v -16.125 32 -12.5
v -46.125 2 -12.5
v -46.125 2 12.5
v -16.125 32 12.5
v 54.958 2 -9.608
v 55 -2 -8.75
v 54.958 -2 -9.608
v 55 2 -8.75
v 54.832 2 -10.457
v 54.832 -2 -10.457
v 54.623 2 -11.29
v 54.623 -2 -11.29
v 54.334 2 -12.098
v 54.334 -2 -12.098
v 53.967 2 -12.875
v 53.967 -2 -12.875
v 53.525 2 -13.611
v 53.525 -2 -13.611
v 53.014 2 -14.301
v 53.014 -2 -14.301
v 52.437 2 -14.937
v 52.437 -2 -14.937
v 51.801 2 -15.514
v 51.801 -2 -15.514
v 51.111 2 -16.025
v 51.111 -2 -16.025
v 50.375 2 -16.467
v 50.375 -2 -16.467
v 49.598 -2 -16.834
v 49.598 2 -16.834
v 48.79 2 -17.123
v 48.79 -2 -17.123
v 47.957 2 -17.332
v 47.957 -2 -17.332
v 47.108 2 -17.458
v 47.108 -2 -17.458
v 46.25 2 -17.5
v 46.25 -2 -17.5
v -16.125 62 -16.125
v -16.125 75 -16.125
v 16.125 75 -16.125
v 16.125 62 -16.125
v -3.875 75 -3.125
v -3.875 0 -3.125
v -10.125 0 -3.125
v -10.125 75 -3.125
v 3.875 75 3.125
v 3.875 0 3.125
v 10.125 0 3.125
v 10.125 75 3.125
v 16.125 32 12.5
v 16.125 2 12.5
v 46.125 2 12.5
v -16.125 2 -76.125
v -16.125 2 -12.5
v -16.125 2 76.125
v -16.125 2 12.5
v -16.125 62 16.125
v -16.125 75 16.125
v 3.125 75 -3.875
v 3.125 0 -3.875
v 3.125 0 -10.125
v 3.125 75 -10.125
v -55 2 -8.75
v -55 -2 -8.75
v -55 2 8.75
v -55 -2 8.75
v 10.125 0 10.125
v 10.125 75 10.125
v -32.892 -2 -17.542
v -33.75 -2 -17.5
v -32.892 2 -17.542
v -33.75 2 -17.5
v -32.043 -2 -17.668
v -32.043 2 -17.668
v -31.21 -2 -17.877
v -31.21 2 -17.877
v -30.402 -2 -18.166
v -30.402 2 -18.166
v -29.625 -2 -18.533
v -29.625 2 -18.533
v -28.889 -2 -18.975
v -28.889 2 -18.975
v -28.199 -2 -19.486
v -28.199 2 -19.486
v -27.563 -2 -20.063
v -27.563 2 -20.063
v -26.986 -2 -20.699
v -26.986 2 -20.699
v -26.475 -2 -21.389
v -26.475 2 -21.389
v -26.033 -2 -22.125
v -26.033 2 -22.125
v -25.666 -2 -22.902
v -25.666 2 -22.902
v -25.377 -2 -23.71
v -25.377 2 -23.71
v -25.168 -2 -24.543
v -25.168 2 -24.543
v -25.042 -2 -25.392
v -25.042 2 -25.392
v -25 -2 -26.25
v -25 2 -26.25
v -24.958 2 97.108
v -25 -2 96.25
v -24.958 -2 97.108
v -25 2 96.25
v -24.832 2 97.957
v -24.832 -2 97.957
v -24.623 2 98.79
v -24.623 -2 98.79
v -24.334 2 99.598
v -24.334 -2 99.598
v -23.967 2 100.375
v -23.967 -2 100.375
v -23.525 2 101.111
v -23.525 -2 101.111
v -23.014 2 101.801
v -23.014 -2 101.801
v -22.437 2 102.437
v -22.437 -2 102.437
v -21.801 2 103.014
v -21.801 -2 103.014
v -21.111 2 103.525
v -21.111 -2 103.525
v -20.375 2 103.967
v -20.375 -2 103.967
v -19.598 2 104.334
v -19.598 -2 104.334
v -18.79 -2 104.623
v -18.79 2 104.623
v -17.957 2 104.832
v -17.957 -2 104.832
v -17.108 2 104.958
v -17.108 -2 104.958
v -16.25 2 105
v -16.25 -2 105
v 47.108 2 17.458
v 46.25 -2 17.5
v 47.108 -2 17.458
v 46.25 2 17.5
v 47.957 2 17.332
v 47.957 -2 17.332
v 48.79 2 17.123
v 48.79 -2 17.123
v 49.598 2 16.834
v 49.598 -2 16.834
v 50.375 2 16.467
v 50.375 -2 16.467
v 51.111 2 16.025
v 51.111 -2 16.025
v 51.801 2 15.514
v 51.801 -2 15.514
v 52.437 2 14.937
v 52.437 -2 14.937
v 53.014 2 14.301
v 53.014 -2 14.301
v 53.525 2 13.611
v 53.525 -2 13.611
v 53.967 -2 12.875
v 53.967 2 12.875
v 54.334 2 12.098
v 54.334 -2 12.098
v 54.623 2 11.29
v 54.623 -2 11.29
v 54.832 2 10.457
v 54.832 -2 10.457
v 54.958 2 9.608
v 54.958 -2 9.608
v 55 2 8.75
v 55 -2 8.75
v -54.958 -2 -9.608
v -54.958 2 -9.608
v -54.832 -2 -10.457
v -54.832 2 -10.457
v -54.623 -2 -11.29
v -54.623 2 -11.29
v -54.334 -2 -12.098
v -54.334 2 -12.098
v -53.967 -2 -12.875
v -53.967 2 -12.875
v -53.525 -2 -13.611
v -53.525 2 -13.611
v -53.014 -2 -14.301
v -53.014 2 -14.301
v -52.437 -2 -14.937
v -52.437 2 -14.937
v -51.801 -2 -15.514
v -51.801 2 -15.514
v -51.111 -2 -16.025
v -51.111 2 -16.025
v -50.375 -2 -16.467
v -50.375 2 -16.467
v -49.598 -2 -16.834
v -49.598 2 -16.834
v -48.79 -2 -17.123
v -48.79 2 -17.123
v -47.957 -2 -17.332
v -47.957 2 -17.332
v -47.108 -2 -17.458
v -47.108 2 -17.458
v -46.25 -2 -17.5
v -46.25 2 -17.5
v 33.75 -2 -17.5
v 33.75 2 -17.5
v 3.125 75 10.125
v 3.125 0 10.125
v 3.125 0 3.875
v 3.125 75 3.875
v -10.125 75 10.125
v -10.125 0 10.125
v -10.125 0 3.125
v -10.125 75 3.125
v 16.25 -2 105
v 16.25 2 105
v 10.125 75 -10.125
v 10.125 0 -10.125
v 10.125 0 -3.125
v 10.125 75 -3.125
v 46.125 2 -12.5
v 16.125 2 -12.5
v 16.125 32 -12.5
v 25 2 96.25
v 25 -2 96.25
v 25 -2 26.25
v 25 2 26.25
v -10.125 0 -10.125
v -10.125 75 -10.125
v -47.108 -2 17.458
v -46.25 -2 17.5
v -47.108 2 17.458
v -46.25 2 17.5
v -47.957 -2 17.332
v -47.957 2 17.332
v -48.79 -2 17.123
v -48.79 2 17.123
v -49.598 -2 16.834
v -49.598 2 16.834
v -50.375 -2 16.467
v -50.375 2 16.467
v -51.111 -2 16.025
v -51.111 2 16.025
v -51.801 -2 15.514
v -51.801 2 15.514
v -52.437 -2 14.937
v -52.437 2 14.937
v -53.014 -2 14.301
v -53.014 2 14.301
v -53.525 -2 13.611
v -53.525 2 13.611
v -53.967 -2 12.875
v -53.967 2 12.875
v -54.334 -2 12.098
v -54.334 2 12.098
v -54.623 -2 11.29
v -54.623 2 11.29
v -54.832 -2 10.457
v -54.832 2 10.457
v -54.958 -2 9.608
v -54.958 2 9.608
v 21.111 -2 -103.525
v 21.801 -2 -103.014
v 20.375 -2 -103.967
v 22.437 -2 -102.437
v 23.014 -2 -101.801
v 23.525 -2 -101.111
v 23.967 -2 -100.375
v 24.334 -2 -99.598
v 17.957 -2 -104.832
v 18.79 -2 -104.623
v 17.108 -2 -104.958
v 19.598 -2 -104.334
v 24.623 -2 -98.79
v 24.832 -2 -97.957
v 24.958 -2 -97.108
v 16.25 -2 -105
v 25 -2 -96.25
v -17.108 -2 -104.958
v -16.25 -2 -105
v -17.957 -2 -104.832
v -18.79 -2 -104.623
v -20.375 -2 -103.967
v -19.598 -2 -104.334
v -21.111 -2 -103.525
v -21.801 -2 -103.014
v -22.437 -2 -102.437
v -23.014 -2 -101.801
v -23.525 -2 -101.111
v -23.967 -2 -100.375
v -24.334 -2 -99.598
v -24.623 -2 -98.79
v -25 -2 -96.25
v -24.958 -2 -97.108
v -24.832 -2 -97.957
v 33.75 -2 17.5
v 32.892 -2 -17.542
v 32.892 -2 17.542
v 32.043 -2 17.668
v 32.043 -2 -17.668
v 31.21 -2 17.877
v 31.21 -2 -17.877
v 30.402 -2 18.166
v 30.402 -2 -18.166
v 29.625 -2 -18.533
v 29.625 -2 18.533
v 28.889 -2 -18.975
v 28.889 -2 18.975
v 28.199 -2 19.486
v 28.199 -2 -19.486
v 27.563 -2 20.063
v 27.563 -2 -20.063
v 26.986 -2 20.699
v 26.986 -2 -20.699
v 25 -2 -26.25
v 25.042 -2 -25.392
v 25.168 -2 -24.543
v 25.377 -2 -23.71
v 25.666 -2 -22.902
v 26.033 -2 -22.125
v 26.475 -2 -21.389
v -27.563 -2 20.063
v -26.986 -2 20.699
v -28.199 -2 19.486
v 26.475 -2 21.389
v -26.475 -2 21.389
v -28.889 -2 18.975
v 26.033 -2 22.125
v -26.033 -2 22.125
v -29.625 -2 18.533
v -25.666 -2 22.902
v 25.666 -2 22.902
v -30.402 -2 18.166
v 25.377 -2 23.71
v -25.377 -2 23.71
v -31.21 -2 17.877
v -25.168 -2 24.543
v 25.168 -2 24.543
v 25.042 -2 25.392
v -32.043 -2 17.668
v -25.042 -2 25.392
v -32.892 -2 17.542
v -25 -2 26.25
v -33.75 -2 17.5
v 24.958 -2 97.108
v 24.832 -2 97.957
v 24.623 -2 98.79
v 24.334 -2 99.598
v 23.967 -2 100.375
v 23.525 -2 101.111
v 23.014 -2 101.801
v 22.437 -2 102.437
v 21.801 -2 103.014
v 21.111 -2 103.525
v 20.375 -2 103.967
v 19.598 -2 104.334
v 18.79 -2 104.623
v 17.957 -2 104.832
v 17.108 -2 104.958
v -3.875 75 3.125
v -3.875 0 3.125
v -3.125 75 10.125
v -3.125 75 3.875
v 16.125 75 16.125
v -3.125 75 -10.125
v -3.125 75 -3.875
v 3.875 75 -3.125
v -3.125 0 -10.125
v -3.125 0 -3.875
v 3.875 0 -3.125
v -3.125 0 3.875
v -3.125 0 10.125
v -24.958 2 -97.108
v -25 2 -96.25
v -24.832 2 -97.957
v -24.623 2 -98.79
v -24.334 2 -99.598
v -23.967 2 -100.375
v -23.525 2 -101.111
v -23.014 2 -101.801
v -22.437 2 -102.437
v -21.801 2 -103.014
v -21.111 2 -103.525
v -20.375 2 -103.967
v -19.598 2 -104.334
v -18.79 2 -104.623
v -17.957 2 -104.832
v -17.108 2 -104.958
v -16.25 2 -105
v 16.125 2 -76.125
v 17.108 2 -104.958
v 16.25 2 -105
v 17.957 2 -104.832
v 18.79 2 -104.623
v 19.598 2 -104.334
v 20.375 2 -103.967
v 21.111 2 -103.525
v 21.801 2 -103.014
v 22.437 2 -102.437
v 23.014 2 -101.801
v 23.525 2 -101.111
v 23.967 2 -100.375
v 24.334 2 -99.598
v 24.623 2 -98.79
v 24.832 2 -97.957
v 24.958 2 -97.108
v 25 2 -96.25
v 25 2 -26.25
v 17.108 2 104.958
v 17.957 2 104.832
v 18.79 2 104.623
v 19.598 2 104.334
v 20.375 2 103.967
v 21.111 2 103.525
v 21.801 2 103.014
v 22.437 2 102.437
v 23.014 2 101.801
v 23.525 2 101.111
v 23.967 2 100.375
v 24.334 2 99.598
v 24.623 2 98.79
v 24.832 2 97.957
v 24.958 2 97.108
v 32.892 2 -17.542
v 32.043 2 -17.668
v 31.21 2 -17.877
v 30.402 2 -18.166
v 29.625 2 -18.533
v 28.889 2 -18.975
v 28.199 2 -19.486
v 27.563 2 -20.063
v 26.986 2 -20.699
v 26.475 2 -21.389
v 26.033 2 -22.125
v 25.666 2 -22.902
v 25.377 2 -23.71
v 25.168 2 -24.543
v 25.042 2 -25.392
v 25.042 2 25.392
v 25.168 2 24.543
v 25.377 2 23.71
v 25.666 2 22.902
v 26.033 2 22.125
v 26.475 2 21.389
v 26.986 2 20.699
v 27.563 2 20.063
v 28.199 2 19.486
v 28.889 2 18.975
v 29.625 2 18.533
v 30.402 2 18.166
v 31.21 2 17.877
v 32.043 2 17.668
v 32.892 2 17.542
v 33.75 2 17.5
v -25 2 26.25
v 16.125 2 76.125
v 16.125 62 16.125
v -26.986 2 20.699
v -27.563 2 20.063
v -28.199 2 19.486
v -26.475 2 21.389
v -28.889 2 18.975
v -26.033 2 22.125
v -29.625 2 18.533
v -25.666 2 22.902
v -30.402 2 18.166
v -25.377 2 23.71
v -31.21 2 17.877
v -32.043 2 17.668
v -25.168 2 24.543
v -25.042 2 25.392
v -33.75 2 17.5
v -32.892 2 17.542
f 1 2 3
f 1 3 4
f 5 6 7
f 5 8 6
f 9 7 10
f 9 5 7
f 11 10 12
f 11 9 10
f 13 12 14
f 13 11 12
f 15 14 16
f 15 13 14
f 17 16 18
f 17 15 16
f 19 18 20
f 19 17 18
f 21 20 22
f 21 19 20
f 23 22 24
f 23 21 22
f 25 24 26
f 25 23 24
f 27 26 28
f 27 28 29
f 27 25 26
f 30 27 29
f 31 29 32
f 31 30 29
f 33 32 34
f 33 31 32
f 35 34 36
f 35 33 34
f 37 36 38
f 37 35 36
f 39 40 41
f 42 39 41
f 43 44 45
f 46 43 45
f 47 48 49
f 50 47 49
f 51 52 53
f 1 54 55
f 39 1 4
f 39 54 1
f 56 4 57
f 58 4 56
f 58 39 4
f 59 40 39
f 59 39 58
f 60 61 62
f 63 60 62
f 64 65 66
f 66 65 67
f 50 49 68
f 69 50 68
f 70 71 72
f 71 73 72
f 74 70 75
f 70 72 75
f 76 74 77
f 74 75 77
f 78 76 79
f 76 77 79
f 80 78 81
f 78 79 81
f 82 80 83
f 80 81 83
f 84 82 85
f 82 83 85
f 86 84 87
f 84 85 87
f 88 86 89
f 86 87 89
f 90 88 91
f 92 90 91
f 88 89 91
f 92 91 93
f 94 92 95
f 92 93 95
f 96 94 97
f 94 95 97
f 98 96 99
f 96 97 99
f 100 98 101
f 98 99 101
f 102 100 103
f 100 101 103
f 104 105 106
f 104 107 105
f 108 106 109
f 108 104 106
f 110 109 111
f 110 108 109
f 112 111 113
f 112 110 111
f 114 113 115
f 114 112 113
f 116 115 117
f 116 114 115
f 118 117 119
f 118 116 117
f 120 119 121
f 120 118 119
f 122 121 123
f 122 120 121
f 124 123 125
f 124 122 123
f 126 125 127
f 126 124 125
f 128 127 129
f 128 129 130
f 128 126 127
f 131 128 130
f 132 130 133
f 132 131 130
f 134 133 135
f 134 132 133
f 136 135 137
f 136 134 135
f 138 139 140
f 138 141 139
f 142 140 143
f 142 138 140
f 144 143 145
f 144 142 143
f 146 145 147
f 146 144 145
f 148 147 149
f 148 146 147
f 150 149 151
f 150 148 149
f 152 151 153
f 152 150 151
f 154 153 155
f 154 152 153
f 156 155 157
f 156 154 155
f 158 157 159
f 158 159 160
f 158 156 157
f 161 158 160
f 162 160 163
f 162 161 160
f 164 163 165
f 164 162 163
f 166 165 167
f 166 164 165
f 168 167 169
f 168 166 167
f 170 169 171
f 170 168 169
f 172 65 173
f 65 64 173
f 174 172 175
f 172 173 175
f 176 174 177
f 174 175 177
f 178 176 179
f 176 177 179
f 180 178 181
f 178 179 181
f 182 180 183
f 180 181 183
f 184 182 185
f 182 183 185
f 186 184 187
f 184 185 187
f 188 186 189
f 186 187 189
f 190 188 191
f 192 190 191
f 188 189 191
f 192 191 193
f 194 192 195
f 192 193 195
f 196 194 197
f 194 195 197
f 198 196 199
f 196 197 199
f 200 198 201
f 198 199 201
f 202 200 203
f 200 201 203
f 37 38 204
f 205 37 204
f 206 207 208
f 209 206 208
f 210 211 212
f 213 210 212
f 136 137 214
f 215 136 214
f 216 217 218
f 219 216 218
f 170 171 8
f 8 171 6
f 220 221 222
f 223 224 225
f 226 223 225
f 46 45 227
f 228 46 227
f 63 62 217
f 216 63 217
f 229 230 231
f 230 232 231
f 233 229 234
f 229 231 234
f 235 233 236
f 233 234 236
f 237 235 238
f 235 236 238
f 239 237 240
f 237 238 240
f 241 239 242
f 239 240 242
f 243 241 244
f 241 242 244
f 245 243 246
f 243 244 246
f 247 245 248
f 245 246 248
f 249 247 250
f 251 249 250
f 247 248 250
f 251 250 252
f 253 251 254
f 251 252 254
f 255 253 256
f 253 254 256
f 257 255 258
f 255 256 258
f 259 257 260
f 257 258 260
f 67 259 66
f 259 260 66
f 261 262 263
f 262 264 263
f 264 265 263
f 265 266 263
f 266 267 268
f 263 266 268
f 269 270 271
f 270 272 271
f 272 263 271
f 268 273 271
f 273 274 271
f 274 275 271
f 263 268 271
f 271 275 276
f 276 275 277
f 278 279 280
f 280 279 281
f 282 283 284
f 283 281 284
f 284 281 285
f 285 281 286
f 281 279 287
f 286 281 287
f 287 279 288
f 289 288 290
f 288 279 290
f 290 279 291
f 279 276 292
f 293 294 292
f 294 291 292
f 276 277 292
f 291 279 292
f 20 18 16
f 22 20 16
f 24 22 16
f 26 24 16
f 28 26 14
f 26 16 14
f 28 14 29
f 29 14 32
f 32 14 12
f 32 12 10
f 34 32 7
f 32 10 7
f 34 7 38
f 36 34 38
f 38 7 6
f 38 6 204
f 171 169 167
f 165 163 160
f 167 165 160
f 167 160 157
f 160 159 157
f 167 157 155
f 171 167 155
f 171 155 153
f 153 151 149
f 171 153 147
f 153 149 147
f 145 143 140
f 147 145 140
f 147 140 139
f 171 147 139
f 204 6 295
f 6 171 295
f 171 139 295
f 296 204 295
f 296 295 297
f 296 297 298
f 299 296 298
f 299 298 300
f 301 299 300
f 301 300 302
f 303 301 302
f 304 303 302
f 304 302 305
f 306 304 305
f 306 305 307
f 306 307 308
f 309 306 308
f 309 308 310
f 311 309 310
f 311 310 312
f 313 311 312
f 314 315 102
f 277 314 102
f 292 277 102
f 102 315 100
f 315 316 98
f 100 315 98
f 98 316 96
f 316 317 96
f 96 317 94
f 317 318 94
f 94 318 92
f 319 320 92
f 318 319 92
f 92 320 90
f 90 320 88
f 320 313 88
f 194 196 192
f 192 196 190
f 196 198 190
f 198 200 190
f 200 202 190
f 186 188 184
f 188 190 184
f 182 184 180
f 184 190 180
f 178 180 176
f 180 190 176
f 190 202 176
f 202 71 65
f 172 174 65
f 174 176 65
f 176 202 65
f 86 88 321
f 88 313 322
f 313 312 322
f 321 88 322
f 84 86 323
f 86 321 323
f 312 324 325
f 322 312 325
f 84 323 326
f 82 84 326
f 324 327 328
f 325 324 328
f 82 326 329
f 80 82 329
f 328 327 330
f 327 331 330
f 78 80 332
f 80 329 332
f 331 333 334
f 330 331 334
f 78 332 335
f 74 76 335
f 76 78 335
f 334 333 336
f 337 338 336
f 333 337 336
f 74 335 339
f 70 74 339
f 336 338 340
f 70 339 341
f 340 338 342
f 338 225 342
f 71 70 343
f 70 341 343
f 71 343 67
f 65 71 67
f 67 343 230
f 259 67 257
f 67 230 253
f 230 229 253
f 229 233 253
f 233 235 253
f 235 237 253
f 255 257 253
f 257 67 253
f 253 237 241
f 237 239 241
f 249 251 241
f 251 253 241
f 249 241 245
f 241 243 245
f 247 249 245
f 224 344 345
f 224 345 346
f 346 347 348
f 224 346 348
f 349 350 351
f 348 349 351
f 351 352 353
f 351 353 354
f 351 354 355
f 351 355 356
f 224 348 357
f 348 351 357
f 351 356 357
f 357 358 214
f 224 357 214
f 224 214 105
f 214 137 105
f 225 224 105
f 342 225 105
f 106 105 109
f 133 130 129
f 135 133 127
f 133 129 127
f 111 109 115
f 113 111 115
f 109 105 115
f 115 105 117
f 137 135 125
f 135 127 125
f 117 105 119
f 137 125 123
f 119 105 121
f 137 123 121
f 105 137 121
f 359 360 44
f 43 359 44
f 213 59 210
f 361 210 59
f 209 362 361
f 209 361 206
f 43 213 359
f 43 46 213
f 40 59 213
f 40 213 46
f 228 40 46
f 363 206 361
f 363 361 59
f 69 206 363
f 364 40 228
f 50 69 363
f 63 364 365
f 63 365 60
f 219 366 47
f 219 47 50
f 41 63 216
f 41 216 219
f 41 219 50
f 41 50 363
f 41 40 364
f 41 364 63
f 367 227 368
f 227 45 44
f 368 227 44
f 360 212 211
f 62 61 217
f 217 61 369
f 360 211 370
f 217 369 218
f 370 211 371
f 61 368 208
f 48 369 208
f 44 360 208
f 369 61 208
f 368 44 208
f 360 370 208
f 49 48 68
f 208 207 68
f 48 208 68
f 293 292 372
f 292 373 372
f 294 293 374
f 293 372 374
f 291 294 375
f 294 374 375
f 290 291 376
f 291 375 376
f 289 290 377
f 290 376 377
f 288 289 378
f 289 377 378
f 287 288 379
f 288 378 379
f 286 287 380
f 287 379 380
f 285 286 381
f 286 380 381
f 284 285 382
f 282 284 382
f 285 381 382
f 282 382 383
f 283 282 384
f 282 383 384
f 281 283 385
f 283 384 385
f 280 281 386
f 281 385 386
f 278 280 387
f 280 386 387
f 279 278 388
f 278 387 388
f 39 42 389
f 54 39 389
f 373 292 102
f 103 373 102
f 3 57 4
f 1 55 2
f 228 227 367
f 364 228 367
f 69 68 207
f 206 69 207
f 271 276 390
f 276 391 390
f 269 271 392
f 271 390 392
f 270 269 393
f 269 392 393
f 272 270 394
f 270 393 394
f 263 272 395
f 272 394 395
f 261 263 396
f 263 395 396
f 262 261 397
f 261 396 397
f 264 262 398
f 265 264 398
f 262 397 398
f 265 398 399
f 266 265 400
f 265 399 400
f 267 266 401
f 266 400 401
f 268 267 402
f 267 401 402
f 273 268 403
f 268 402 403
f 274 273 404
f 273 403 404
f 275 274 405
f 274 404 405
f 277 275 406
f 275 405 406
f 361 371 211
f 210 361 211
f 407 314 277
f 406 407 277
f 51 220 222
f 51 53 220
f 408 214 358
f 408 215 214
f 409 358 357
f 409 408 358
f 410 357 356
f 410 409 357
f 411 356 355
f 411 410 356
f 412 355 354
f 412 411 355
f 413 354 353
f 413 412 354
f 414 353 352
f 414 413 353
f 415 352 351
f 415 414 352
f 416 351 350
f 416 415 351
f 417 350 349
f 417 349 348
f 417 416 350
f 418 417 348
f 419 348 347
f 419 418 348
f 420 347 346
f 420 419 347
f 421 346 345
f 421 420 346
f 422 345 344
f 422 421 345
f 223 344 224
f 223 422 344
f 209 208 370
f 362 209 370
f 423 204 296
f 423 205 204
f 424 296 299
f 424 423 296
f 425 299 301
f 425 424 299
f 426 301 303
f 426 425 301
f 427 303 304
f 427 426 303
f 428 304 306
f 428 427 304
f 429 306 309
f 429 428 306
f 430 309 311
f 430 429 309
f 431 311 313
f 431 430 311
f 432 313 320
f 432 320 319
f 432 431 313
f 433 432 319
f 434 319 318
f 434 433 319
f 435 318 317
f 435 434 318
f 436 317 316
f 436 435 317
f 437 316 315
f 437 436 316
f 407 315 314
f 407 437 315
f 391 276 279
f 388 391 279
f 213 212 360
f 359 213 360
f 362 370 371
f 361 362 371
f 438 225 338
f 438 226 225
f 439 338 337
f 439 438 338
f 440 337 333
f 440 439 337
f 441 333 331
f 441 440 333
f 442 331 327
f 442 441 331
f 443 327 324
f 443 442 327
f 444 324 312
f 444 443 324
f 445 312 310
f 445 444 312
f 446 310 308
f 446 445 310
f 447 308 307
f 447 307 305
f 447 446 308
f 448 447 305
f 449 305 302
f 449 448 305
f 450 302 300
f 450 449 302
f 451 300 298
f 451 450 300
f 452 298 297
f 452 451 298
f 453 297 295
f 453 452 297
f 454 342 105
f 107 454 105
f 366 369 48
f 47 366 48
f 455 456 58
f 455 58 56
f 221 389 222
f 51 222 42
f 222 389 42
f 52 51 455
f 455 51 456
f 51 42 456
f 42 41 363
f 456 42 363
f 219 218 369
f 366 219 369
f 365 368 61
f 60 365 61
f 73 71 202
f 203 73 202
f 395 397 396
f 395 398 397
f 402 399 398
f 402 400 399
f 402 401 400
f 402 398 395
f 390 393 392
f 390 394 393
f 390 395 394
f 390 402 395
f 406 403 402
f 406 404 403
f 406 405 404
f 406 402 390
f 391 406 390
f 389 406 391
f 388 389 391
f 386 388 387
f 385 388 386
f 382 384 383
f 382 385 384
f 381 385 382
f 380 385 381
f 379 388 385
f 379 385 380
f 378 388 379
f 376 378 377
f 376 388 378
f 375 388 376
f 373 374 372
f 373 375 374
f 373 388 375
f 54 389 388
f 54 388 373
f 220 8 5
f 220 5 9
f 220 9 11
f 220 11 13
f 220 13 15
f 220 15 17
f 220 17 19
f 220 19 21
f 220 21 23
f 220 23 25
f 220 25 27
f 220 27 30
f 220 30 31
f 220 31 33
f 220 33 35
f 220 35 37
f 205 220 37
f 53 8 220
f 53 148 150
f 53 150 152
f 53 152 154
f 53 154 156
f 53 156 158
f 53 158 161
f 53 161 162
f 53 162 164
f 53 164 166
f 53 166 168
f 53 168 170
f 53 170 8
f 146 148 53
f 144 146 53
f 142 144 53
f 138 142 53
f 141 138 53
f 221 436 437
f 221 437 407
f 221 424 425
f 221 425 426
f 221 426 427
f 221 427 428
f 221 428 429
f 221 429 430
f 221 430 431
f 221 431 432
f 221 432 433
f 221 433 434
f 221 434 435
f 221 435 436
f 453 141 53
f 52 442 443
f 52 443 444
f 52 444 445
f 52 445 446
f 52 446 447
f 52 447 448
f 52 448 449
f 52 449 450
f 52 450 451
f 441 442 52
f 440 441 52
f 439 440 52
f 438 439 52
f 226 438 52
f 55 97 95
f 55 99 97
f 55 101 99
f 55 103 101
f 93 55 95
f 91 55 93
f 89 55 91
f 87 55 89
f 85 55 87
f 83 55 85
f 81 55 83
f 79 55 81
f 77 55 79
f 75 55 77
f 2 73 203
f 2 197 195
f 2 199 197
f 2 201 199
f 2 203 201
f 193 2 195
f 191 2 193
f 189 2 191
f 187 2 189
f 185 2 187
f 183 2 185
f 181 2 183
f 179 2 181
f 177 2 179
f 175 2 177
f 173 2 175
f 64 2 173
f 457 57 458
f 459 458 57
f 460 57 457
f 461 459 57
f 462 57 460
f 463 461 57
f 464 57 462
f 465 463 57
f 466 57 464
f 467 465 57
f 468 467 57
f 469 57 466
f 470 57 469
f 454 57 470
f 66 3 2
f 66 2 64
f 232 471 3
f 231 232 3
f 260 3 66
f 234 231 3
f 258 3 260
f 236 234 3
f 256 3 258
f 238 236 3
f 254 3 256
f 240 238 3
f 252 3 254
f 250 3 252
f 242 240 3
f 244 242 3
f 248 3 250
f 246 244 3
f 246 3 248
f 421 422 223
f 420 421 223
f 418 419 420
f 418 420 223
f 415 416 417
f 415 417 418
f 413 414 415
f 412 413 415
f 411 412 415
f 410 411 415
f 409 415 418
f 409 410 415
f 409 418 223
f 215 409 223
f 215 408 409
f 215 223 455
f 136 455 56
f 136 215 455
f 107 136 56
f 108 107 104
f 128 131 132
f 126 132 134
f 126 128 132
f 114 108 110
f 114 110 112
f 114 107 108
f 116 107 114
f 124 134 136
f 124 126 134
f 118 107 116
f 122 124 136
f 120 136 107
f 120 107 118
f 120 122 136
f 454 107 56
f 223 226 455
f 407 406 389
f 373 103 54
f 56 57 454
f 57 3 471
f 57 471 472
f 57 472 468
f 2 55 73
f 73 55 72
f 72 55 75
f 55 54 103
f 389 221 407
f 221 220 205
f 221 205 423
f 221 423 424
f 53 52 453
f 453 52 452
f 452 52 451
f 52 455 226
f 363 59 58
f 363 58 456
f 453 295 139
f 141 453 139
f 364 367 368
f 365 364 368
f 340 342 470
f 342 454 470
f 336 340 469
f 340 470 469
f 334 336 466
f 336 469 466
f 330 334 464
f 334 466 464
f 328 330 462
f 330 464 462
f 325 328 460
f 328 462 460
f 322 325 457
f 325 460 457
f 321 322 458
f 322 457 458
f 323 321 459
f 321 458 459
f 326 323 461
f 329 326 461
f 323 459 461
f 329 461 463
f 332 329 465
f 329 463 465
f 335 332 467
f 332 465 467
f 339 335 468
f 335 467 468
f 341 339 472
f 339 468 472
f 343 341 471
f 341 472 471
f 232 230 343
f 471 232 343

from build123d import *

# Parameters (mm, degrees)
SKETCH2_W            = 32.25
SKETCH2_H            = 32.25
BOSS_EXTRUDE1_DEPTH  = 75
SKETCH3_W            = 32.25
SKETCH3_H            = 32.25
BOSS_EXTRUDE2_DEPTH  = 2
SKETCH4_W            = 32.25
SKETCH4_H            = 32.25
BOSS_EXTRUDE3_DEPTH  = 4
FILLET1_R            = 8.75
BOSS_EXTRUDE4_DEPTH  = 32.25
BOSS_EXTRUDE12_DEPTH = 12.5


with BuildPart() as part:
    # Sketch2 → Boss-Extrude1 (new body)
    with BuildSketch(Plane(origin=(0, 0, 0), x_dir=(1, 0, 0), z_dir=(0, 1, 0))):
        Rectangle(SKETCH2_W, SKETCH2_H)
        Polygon((-3.125, 10.125), (-3.125, 3.875), (3.125, 3.875), (3.125, 10.125), (10.125, 10.125), (10.125, 3.125), (3.875, 3.125), (3.875, -3.125), (10.125, -3.125), (10.125, -10.125), (3.125, -10.125), (3.125, -3.875), (-3.125, -3.875), (-3.125, -10.125), (-10.125, -10.125), (-10.125, -3.125), (-3.875, -3.125), (-3.875, 3.125), (-10.125, 3.125), (-10.125, 10.125), align=None, mode=Mode.SUBTRACT)
    extrude(amount=BOSS_EXTRUDE1_DEPTH)

    # Sketch3 → Boss-Extrude2 (add)
    with BuildSketch(Plane.XZ):
        Rectangle(SKETCH3_W, SKETCH3_H)
    extrude(amount=BOSS_EXTRUDE2_DEPTH)

    # Sketch4 → Boss-Extrude3 (add)
    with BuildSketch(Plane.XZ.offset(2)):
        Polygon((-25, 17.5), (-25, 105), (25, 105), (25, 17.5), (55, 17.5), (55, -17.5), (25, -17.5), (25, -105), (-25, -105), (-25, -17.5), (-55, -17.5), (-55, 17.5), align=None)
        Rectangle(SKETCH4_W, SKETCH4_H, mode=Mode.SUBTRACT)
    extrude(amount=-BOSS_EXTRUDE3_DEPTH)

    # Fillet1
    fillet1_edges = [part.edges().sort_by_distance(p)[0] for p in [
        (-25, 0, -105),
        (-25, 0, -17.5),
        (-55, 0, -17.5),
        (-55, 0, 17.5),
        (-25, 0, 17.5),
        (-25, 0, 105),
        (25, 0, 105),
        (25, 0, 17.5),
        (55, 0, 17.5),
        (55, 0, -17.5),
        (25, 0, -17.5),
        (25, 0, -105),
    ]]
    fillet(fillet1_edges, radius=FILLET1_R)

    # Sketch5 → Boss-Extrude4 (add)
    with BuildSketch(Plane(origin=(16.125, 0, 0), x_dir=(0, 0, -1), z_dir=(1, 0, 0))):
        Polygon((16.125, 62), (76.125, 2), (16.125, 2), align=None)
        Polygon((-16.125, 62), (-76.125, 2), (-16.125, 2), align=None)
    extrude(amount=-BOSS_EXTRUDE4_DEPTH)

    # Sketch7 → Boss-Extrude12 (add, symmetric)
    with BuildSketch(Plane.XY):
        Polygon((-16.125, 2), (-46.125, 2), (-16.125, 32), align=None)
        Polygon((46.125, 2), (16.125, 32), (16.125, 2), align=None)
    extrude(amount=BOSS_EXTRUDE12_DEPTH, both=True)


solid = part.part
